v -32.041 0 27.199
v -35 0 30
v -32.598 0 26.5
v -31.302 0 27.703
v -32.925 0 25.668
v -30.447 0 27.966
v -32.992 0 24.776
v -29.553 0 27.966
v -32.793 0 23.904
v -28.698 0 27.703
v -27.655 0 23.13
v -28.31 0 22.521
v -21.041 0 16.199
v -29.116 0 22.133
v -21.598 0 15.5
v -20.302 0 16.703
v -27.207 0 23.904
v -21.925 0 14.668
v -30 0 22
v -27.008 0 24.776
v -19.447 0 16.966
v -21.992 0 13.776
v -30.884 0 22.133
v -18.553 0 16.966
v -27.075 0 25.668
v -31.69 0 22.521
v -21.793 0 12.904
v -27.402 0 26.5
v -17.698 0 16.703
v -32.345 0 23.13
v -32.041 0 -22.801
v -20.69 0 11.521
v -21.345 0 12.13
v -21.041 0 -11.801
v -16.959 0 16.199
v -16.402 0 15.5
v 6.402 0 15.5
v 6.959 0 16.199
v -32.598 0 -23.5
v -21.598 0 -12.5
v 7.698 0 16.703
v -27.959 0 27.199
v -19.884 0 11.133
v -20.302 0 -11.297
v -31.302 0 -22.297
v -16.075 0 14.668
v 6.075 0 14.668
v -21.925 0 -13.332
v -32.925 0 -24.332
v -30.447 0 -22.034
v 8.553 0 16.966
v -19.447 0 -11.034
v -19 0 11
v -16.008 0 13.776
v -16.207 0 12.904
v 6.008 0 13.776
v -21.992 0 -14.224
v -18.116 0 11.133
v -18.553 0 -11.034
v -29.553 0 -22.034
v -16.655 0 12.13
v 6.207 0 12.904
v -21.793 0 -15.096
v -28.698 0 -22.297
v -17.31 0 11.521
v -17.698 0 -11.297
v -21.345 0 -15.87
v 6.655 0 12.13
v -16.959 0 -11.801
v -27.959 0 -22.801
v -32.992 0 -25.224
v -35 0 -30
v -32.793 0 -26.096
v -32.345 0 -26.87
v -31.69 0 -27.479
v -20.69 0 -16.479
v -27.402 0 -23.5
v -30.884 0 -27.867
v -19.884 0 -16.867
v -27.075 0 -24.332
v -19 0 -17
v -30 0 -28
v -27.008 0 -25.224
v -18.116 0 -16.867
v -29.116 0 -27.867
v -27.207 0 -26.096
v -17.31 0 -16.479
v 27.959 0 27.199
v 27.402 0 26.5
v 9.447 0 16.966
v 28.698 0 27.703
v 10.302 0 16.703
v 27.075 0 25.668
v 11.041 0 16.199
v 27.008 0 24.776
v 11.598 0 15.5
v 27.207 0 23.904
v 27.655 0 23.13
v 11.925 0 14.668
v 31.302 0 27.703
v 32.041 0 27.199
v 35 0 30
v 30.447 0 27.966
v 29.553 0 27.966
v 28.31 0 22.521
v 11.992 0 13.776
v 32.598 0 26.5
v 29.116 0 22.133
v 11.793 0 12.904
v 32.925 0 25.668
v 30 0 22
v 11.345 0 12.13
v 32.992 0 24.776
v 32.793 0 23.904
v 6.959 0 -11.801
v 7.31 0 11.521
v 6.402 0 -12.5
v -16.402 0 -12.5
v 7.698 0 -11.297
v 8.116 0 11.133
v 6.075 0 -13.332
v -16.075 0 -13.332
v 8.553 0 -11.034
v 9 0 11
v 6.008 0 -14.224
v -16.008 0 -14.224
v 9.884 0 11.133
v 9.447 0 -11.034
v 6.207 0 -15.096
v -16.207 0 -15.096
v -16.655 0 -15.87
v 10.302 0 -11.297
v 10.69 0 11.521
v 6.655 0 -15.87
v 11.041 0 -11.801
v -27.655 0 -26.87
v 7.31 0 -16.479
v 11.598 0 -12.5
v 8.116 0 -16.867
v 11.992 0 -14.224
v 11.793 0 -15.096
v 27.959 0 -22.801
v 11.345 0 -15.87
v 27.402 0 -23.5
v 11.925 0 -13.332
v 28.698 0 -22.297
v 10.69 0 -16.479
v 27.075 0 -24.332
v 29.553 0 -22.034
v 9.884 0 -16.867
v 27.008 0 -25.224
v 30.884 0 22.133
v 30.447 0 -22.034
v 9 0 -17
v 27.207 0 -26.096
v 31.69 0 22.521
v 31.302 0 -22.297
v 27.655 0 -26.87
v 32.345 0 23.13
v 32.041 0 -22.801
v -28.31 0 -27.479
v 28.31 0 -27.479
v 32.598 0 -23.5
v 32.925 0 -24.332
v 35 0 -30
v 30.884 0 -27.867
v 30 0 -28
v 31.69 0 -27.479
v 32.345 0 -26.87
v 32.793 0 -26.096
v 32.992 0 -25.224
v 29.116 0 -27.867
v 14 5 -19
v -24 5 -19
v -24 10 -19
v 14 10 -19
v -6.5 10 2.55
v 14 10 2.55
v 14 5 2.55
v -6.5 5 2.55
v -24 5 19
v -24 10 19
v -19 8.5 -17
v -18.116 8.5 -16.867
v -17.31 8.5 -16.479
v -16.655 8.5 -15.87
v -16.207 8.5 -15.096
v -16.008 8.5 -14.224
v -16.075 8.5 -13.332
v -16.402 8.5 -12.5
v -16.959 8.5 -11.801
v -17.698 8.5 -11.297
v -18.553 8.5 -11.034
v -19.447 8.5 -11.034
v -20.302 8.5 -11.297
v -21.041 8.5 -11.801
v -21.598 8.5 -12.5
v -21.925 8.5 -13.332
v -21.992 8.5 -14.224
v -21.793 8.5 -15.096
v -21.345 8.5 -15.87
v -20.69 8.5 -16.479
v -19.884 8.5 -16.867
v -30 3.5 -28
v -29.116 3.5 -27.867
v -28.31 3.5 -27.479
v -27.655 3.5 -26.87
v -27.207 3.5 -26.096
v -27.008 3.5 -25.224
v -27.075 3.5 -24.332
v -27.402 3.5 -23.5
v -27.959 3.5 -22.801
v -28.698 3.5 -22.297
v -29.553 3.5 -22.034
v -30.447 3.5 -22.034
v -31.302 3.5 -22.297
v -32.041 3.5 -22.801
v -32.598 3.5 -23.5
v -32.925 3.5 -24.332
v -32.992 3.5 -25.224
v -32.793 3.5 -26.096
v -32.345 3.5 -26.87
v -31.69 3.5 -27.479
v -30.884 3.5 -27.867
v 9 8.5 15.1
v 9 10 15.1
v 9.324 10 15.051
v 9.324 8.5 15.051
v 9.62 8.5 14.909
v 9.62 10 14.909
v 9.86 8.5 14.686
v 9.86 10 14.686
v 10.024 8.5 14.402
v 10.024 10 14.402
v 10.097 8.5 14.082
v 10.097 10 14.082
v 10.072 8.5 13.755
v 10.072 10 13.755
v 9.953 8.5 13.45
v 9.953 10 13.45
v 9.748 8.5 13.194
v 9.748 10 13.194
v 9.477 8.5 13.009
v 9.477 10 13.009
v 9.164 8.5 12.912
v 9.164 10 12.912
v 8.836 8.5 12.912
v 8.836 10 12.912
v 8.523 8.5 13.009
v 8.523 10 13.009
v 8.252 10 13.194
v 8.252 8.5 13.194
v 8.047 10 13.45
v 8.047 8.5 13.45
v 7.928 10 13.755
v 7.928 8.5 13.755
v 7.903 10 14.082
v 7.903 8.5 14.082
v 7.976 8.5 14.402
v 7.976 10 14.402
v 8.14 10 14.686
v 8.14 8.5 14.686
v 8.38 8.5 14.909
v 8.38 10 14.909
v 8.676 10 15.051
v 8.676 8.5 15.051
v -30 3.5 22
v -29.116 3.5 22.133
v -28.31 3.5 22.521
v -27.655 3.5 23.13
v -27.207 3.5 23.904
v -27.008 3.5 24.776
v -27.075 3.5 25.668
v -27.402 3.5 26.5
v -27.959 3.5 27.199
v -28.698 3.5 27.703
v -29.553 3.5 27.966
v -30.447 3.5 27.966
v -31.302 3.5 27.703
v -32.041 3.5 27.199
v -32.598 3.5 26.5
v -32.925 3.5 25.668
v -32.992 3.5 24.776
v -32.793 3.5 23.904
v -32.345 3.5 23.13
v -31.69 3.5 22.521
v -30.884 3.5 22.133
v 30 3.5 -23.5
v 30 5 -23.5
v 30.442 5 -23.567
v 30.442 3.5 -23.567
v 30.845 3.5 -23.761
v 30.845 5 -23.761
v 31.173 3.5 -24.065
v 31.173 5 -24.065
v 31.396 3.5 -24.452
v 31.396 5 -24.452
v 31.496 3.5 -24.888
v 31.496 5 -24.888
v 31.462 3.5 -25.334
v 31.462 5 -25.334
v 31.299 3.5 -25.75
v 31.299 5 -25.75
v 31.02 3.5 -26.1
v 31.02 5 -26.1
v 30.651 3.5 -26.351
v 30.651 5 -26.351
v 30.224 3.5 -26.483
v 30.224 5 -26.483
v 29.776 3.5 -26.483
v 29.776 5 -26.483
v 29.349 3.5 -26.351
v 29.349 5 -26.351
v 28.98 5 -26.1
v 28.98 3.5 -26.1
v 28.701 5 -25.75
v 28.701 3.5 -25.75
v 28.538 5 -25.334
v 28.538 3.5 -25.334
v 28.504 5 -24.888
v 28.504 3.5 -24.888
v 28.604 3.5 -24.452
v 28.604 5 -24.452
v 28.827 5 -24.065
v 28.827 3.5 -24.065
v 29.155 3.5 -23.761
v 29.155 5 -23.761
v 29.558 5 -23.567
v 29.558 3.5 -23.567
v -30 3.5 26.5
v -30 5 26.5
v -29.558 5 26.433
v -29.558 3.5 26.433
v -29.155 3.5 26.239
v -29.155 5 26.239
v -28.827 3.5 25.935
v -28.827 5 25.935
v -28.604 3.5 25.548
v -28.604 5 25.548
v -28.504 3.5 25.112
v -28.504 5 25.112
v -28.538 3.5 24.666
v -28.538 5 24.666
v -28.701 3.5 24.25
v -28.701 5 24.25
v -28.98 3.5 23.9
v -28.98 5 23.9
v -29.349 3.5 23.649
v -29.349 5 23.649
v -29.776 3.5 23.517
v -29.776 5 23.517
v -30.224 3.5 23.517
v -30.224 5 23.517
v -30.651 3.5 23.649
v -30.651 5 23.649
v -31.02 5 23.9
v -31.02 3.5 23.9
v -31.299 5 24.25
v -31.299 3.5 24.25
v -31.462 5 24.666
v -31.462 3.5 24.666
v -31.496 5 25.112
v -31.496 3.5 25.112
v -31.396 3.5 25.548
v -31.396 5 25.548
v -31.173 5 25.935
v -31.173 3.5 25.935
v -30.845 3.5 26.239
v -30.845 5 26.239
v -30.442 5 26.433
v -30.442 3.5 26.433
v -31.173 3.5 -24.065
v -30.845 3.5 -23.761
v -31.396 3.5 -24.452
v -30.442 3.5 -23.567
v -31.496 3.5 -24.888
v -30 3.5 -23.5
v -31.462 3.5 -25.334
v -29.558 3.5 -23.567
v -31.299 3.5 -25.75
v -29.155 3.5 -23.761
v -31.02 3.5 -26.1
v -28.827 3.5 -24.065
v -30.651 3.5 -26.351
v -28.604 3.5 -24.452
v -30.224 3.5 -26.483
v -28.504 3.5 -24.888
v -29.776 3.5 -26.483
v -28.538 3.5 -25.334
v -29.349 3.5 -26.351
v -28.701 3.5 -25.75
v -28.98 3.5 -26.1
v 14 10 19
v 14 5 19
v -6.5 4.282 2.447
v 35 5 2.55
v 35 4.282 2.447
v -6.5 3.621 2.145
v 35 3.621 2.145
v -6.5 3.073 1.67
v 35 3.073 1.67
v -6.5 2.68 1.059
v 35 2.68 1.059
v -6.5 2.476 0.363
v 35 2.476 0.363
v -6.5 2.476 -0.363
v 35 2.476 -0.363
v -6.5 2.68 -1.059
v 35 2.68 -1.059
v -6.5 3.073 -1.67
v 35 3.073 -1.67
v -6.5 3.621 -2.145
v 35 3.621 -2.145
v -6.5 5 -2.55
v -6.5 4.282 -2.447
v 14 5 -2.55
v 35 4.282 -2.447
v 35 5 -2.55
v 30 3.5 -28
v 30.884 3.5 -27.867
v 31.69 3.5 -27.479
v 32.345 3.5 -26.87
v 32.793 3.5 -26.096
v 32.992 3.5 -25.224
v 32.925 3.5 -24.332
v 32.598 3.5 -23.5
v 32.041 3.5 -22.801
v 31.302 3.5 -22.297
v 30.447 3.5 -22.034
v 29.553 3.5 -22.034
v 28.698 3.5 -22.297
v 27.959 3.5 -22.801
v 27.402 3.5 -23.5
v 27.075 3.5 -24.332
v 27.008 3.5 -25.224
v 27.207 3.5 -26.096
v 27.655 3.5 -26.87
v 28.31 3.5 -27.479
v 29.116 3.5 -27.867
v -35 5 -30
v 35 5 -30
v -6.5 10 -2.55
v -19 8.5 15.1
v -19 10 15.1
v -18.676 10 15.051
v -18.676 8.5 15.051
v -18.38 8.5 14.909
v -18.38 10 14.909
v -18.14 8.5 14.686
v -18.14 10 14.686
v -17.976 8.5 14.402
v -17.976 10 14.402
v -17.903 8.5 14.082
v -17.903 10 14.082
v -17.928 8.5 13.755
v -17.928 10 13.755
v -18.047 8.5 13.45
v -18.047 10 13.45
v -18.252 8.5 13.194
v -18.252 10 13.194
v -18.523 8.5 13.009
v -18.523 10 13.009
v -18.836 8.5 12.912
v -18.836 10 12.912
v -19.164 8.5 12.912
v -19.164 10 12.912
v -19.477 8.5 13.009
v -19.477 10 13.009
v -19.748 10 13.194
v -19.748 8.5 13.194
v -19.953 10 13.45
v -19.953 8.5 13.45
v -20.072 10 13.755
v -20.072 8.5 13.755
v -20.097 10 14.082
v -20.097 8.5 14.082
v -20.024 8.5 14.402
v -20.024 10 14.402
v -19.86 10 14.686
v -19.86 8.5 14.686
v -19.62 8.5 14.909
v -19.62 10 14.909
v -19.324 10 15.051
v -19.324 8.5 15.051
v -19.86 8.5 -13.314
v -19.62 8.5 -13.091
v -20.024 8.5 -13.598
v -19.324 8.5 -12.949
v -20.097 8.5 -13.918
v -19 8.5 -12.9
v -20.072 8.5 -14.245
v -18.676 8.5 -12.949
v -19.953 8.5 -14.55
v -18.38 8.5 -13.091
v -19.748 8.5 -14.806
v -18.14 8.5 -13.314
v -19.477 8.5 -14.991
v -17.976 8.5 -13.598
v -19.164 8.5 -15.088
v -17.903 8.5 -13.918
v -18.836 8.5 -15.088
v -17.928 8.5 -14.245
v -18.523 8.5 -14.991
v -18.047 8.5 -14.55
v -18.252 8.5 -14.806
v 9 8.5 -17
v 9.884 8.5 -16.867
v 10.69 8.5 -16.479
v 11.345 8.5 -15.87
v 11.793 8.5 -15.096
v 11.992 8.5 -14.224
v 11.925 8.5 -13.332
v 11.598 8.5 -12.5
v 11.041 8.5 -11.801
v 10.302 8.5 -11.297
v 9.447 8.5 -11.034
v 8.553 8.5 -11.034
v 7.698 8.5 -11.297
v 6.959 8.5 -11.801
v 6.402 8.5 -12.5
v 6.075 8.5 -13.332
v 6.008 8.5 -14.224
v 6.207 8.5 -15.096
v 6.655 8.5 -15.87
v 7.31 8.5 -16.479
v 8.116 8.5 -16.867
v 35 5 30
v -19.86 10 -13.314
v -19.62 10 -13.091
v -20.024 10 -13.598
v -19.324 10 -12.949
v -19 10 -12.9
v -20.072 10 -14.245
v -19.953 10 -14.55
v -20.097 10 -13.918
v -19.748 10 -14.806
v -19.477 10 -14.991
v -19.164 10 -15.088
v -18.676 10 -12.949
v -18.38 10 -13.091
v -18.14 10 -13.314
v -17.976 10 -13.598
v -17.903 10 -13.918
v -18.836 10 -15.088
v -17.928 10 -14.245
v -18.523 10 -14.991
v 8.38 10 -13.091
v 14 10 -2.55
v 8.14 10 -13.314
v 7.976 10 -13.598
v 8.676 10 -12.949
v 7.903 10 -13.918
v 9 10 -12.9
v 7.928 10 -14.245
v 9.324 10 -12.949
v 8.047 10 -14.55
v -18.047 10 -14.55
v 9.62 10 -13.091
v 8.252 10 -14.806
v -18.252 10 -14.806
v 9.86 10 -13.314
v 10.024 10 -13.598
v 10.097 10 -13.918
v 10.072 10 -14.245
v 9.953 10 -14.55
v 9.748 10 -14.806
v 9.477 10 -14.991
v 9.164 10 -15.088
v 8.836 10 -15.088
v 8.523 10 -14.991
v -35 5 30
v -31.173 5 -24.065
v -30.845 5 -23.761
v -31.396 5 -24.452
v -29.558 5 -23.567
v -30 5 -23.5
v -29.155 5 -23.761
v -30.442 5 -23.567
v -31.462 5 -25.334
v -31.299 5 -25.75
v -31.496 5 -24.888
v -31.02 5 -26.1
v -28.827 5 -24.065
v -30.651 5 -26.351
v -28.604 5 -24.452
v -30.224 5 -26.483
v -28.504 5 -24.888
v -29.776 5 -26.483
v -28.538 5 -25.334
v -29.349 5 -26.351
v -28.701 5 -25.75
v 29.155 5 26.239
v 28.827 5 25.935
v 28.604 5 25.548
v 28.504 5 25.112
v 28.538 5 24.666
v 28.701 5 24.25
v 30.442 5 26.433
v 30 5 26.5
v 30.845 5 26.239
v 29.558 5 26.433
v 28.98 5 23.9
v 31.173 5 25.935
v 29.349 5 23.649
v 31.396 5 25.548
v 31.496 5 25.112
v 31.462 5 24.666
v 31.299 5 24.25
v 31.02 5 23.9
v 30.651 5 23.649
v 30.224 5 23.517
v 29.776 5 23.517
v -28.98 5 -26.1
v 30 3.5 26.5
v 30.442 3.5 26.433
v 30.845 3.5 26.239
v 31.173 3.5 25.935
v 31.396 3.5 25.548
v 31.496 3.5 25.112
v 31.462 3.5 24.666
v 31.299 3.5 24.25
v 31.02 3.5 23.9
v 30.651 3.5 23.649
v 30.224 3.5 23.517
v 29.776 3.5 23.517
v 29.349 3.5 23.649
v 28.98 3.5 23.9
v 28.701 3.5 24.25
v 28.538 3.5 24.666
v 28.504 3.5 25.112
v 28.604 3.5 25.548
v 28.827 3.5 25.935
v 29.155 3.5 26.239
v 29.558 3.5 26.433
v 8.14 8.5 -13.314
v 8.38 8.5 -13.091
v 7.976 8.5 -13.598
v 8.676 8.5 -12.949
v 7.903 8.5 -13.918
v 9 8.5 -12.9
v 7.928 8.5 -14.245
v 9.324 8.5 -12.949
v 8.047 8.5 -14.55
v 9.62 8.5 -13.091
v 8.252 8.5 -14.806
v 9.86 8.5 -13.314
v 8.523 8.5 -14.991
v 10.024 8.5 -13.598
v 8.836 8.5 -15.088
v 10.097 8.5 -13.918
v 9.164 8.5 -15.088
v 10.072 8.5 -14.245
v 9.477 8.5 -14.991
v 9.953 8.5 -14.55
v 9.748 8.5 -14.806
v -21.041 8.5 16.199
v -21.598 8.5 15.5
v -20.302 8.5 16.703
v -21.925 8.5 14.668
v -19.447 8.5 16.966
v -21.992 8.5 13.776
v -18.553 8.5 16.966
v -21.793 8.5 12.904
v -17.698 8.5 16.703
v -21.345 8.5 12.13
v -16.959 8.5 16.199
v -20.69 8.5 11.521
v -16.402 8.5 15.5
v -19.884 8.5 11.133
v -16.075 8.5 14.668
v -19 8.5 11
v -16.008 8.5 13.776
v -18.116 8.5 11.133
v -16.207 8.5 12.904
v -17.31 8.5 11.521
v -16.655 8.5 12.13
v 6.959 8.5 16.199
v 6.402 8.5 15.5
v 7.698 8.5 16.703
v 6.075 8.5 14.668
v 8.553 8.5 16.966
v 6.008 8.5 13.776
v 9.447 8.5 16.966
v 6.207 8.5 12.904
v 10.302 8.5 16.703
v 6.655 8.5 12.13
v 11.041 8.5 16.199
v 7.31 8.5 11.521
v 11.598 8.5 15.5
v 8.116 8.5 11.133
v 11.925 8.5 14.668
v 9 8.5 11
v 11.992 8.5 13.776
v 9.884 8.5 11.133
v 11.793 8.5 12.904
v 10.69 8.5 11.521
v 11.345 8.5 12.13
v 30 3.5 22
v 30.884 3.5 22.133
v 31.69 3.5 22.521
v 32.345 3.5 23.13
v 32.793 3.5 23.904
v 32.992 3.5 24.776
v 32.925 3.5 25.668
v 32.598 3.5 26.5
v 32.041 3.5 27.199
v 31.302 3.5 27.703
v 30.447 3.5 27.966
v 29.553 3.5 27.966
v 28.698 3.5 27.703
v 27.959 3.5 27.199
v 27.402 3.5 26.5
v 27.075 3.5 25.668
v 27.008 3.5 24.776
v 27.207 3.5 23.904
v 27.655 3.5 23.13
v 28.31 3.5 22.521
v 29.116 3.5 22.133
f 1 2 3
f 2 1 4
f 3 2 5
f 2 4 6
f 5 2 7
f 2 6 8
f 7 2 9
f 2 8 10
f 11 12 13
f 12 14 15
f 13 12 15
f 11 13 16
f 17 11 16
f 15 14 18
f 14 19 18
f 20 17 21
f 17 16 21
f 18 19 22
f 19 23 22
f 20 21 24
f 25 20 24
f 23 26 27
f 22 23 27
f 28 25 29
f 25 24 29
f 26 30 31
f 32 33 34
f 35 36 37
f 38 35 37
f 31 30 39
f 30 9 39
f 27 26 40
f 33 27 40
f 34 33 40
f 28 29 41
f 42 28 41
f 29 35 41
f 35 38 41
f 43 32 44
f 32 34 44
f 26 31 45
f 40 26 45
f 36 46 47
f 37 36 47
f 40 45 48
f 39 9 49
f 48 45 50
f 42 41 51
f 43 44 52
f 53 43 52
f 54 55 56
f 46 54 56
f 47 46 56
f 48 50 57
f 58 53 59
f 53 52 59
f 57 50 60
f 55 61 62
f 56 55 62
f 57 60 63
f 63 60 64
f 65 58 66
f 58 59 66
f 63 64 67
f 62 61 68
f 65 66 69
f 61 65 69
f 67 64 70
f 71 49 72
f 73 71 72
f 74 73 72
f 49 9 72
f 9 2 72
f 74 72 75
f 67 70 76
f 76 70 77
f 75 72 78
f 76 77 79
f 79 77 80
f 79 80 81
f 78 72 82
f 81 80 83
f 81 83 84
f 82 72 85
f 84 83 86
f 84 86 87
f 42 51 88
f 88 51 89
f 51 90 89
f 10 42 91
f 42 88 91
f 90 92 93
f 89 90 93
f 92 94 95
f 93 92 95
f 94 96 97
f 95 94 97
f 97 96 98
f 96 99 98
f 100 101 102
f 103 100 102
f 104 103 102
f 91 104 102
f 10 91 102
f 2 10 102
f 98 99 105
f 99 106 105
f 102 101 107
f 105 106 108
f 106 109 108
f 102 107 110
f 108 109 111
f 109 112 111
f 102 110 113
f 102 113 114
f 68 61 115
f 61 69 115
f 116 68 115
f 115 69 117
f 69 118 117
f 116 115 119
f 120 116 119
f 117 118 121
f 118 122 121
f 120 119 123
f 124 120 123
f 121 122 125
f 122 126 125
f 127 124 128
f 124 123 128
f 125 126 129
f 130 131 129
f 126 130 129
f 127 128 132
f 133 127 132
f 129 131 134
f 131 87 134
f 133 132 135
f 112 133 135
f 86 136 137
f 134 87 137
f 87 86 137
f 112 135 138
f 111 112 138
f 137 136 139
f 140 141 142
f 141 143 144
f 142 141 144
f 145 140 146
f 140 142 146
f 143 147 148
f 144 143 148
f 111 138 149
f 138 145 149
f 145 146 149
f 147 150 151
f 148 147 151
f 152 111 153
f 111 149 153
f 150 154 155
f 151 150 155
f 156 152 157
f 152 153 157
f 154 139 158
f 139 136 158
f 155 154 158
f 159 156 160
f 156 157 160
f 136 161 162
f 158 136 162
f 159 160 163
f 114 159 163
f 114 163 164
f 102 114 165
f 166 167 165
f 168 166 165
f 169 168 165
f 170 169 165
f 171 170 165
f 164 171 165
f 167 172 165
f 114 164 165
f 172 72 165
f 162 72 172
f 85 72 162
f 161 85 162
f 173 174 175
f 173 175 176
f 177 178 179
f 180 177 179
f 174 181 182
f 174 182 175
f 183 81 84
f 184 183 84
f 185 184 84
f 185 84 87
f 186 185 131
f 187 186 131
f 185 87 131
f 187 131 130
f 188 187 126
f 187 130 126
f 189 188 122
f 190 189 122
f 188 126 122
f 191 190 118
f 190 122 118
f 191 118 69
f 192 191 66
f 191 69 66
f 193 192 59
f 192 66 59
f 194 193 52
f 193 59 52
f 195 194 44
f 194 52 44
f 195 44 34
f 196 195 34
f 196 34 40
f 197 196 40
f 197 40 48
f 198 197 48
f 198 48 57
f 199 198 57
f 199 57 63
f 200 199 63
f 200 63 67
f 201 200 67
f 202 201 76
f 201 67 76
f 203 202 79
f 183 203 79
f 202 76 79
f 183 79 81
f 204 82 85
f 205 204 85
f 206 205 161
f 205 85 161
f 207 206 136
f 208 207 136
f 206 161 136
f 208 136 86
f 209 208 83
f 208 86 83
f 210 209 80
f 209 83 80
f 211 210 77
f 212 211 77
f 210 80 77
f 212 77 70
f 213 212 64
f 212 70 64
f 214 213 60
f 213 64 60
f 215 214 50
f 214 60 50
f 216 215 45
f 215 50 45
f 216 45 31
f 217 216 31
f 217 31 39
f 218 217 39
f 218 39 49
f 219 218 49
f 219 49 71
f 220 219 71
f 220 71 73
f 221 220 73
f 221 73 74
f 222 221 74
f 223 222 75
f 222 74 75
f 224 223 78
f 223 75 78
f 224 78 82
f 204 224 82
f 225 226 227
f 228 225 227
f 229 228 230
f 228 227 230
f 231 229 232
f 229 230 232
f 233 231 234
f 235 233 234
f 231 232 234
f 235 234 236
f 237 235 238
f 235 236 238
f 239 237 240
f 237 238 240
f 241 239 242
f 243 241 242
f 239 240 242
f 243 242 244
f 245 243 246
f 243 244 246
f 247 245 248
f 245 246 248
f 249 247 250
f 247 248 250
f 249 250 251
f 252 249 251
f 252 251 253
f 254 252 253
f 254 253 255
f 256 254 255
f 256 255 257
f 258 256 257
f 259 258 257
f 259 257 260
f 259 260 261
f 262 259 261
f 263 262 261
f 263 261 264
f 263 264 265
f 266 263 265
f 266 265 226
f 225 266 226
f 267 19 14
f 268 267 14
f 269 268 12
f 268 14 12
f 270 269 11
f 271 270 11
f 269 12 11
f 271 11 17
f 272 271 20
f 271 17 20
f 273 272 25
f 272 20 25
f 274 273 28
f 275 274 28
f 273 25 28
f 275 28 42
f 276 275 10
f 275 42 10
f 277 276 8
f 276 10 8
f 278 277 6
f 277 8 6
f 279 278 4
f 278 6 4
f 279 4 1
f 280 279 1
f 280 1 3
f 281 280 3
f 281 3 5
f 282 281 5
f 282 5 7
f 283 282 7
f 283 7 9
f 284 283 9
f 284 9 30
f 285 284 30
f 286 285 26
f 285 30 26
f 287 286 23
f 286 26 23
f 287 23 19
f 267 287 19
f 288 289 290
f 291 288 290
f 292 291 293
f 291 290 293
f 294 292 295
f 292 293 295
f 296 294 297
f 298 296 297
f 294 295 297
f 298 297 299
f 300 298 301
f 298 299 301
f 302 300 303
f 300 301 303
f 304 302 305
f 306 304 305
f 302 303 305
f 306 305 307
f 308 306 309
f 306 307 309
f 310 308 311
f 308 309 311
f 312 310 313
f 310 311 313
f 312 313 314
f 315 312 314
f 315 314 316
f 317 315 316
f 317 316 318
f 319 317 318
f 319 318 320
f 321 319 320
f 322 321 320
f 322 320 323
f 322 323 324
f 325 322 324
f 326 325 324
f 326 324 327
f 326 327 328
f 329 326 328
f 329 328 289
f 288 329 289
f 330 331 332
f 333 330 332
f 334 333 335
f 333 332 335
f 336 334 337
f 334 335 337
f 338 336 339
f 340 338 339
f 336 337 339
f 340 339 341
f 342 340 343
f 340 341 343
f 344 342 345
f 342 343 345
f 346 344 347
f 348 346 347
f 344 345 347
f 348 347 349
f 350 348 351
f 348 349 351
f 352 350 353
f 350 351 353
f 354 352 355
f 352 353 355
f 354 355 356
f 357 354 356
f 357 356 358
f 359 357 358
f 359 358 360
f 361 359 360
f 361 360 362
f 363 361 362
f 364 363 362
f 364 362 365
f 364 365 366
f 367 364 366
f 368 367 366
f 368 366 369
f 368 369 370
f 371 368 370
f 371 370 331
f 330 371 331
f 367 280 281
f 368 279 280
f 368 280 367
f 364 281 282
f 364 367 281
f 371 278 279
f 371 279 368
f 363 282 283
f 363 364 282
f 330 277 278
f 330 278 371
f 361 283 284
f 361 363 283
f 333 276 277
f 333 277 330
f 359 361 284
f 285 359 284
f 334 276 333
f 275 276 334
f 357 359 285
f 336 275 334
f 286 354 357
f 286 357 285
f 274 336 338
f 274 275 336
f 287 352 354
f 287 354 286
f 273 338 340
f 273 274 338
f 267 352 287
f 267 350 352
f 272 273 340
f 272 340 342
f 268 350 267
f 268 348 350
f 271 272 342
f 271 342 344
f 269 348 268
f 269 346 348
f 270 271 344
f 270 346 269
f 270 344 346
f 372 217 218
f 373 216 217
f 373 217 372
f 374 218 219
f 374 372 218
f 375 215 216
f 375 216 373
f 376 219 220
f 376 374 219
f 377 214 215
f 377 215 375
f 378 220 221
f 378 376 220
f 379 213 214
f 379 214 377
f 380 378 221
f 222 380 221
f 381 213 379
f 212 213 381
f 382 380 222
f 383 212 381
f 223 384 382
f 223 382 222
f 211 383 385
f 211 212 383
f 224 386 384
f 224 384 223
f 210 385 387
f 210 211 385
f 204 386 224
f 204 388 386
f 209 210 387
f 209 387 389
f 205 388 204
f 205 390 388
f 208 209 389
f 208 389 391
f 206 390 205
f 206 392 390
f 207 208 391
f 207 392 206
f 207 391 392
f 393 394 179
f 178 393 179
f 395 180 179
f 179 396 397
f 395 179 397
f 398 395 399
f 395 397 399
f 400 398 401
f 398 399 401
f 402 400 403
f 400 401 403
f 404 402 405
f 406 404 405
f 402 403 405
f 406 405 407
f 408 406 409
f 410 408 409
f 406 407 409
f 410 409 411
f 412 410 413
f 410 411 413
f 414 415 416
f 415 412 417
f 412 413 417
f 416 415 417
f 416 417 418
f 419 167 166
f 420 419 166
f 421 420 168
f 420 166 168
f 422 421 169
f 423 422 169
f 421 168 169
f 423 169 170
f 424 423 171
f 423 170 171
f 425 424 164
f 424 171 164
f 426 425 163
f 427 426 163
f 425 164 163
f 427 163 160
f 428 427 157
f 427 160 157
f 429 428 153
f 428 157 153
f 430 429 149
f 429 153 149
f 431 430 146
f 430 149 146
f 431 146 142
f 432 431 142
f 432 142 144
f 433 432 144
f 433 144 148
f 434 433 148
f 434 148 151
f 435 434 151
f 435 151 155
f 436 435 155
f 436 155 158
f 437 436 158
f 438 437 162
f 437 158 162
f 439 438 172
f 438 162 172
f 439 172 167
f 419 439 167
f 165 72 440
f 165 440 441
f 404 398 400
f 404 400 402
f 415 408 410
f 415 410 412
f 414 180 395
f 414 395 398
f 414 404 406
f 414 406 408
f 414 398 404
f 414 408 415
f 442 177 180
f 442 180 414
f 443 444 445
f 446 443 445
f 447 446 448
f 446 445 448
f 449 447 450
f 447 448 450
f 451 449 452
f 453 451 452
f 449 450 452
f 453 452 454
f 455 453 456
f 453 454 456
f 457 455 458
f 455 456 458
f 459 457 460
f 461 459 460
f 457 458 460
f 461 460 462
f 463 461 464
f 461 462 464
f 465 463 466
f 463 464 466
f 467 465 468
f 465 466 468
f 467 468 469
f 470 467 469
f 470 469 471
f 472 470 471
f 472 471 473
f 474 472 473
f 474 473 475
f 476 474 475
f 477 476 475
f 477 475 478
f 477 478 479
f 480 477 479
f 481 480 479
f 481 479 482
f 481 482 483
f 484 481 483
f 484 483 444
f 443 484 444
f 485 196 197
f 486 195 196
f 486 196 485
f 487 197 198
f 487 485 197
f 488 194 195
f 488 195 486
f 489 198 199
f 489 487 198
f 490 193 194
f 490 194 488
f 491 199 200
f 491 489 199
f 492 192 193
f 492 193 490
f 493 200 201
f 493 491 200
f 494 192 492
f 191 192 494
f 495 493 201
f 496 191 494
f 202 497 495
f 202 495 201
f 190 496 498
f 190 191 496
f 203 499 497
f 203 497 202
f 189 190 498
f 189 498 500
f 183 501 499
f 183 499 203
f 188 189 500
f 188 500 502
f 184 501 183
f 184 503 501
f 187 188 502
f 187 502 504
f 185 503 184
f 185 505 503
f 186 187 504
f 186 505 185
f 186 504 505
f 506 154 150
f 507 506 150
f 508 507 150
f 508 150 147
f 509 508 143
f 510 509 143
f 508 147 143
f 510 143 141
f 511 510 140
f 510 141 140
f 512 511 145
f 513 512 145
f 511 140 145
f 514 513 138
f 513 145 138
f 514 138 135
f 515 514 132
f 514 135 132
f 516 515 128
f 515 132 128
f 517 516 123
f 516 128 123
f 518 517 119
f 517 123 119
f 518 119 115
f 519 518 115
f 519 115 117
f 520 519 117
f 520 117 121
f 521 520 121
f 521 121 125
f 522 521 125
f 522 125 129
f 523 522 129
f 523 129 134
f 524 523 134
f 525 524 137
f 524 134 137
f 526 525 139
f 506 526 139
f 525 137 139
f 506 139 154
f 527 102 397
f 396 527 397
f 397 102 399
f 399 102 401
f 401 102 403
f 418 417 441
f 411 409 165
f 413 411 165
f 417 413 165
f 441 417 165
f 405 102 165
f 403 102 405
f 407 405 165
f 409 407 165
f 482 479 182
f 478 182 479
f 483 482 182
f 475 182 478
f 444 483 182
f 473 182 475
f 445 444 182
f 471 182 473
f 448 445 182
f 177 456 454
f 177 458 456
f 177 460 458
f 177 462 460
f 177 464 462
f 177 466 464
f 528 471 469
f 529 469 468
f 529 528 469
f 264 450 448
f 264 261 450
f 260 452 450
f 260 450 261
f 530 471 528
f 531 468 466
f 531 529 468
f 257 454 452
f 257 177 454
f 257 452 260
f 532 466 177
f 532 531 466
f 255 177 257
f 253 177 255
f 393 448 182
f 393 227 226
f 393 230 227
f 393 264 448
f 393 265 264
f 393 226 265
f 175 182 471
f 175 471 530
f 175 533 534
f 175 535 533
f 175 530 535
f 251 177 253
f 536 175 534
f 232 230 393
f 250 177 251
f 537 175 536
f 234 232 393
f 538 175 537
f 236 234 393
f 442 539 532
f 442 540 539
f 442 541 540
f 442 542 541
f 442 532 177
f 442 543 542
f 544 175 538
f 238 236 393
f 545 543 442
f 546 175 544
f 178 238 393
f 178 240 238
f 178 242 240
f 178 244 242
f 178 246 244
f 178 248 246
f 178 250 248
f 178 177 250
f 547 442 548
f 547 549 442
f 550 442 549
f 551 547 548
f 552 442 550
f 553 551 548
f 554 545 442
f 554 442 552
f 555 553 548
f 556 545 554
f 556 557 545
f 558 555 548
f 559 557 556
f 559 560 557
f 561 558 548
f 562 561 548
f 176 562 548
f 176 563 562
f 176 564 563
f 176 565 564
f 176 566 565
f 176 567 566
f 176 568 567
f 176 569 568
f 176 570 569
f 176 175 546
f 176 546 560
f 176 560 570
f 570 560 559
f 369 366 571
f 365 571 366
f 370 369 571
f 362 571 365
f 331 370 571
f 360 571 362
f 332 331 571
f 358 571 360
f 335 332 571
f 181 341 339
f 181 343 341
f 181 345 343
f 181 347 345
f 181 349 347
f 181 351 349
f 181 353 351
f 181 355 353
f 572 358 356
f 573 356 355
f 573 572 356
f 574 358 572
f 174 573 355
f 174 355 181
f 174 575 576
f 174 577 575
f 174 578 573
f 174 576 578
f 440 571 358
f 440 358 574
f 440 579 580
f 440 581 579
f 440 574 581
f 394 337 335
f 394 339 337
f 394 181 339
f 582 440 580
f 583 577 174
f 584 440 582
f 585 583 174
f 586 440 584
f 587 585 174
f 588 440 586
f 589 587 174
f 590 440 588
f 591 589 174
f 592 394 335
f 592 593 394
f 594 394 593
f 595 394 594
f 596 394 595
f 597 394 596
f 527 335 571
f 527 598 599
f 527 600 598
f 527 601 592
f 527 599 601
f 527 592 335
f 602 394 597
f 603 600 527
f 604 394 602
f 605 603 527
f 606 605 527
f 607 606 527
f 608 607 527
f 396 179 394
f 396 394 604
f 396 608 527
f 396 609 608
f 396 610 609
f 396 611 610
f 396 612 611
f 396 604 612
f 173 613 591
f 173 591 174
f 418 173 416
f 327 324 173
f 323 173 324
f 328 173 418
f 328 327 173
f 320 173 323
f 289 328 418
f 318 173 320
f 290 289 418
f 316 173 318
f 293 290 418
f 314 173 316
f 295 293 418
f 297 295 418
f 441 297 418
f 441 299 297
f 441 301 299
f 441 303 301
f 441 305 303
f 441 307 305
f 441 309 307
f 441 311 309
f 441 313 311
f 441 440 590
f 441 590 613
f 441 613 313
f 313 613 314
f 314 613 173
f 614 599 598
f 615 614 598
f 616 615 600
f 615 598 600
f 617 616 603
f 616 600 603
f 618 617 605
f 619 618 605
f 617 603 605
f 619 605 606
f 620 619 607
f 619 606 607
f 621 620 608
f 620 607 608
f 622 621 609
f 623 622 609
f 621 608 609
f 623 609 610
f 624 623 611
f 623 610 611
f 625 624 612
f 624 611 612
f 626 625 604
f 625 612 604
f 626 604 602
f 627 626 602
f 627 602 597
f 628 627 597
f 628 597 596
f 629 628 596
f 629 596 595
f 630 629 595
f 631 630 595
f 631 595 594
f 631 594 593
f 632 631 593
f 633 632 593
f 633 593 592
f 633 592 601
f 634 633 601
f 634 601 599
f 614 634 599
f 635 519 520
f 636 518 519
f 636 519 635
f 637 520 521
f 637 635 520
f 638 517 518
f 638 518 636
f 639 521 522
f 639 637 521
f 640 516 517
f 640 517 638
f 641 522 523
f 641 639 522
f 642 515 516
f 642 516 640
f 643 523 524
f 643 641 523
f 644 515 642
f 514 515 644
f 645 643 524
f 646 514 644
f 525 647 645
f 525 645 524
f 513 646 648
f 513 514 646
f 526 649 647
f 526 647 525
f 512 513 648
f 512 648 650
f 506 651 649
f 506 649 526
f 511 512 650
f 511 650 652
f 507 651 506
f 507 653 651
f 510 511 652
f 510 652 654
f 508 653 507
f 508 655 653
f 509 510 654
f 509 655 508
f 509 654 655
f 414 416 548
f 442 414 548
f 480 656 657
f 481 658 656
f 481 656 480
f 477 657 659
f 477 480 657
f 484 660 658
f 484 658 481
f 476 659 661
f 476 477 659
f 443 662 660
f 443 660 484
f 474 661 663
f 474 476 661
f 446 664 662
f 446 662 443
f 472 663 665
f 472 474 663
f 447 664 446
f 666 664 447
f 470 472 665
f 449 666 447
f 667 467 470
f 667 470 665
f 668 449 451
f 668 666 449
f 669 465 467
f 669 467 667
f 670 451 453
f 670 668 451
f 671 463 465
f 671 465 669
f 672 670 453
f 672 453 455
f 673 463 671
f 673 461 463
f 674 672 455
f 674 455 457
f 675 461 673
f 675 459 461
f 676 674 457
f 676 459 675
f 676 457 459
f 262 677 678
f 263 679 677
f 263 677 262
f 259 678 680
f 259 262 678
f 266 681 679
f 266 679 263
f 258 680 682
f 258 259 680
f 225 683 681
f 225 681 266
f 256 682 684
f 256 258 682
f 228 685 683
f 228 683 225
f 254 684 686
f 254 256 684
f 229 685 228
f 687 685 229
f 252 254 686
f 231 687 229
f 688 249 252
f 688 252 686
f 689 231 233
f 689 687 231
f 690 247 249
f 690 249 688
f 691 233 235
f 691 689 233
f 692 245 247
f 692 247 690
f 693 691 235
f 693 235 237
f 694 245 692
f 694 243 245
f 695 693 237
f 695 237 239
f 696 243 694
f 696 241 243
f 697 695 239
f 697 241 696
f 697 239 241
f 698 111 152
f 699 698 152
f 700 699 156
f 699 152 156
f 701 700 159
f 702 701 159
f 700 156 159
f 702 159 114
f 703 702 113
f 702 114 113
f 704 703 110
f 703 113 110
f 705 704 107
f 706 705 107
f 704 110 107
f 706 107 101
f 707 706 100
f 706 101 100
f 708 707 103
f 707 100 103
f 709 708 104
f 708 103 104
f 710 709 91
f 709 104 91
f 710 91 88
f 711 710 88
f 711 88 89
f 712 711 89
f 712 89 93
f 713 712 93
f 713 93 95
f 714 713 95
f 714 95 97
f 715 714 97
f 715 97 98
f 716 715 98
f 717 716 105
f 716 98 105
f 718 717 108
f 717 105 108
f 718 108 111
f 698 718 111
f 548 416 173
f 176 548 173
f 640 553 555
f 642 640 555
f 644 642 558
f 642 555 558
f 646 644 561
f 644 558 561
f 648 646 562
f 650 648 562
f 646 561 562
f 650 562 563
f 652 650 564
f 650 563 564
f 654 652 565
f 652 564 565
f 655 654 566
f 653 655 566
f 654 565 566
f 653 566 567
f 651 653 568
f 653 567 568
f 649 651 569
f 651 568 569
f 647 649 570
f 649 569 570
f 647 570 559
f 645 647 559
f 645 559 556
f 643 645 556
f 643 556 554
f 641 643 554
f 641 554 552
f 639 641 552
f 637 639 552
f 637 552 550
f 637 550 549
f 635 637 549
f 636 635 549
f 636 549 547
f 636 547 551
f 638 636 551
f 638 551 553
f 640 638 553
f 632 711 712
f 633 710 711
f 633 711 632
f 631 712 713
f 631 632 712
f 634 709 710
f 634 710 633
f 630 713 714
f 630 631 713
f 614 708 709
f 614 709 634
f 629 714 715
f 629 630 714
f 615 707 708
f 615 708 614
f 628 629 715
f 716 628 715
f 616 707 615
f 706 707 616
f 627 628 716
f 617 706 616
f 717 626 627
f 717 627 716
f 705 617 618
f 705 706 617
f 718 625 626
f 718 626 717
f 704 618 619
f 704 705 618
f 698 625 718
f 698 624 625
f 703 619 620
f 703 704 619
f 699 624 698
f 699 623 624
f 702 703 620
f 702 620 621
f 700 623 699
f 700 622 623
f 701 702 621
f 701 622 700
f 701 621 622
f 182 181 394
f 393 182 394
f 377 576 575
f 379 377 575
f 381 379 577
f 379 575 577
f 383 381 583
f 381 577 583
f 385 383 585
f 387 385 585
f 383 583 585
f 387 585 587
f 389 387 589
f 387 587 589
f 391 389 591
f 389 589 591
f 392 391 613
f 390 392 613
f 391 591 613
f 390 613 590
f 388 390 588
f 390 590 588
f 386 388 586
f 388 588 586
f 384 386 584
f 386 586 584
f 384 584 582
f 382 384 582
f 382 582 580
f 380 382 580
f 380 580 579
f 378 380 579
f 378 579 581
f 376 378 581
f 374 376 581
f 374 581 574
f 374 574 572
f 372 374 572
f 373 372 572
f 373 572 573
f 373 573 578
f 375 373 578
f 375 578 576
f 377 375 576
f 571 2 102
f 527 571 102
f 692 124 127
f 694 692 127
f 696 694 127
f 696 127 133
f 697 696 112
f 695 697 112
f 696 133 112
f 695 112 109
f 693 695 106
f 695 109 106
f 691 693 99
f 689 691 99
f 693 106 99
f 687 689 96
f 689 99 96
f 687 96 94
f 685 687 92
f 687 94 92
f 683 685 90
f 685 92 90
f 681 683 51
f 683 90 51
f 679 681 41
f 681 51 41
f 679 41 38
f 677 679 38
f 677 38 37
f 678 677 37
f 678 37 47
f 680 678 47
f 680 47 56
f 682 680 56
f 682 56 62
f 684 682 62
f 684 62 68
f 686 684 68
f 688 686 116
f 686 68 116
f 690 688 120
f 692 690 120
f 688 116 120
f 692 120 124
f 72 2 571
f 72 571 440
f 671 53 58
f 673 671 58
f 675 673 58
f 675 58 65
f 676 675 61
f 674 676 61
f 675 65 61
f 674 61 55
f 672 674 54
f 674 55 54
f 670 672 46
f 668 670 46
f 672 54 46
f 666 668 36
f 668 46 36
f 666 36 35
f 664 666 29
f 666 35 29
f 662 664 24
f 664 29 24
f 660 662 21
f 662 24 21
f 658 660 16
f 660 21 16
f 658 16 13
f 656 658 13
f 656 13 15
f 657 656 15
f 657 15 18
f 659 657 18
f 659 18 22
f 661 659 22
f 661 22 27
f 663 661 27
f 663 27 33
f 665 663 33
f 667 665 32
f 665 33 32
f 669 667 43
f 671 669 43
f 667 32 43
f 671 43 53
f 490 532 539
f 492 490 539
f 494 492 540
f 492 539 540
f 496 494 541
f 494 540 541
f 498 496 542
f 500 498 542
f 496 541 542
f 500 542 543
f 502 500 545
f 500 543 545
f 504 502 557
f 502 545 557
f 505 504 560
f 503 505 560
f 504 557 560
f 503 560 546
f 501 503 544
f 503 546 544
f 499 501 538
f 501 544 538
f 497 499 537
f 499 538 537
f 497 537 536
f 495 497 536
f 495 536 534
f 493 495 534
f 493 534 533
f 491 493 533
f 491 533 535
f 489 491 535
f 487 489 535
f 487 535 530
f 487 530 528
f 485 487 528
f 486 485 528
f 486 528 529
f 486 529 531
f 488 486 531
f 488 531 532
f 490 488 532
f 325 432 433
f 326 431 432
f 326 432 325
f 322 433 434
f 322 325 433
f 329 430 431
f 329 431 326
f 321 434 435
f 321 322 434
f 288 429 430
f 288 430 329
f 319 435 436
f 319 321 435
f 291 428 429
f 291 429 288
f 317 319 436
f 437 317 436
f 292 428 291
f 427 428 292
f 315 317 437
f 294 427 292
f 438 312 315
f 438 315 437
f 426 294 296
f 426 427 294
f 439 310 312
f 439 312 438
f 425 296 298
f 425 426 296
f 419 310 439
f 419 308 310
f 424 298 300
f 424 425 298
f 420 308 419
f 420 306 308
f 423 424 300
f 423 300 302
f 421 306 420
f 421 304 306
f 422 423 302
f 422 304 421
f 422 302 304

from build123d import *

# Parameters (mm, degrees)
SKETCH_1_W          = 70
SKETCH_1_H          = 60
EXTRUDE_1_DEPTH     = 5
SKETCH_2_W          = 38
SKETCH_2_H          = 38
EXTRUDE_2_DEPTH     = 5
CUT_EXTRUDE_1_REACH = 49.17
SKETCH_3_R          = 1.1
SKETCH_4_R          = 3
CUT_EXTRUDE_2_DEPTH = 8.5
CUT_EXTRUDE_3_REACH = 48.368
SKETCH_5_R          = 1.5
SKETCH_6_R          = 3
CUT_EXTRUDE_4_DEPTH = 3.5
CUT_EXTRUDE_5_DEPTH = 41.5


with BuildPart() as part:
    # 草图1 → 凸台-拉伸1 (new body)
    with BuildSketch(Plane(origin=(0, 0, 0), x_dir=(1, 0, 0), z_dir=(0, 1, 0))):
        Rectangle(SKETCH_1_W, SKETCH_1_H)
    extrude(amount=EXTRUDE_1_DEPTH)

    # 草图2 → 凸台-拉伸2 (add)
    with BuildSketch(Plane(origin=(0, 5, 0), x_dir=(1, 0, 0), z_dir=(0, 1, 0))):
        with Locations((-5, 0)):
            Rectangle(SKETCH_2_W, SKETCH_2_H)
    extrude(amount=EXTRUDE_2_DEPTH)

    # 草图3 → 切除-拉伸1 (cut, up to next)
    with BuildSketch(Plane(origin=(0, 10, 0), x_dir=(1, 0, 0), z_dir=(0, 1, 0)), mode=Mode.PRIVATE) as cut_extrude_1_sk1:
        with Locations(Location((-19, 14, 0), (0, 0, 270))):
            Circle(SKETCH_3_R)
    cut_extrude_1_tool1 = extrude(cut_extrude_1_sk1.sketch, amount=-CUT_EXTRUDE_1_REACH, mode=Mode.PRIVATE) & part.part
    # 草图3 → 切除-拉伸1 (cut, up to next)
    with BuildSketch(Plane(origin=(0, 10, 0), x_dir=(1, 0, 0), z_dir=(0, 1, 0)), mode=Mode.PRIVATE) as cut_extrude_1_sk2:
        with Locations(Location((9, 14, 0), (0, 0, 270))):
            Circle(SKETCH_3_R)
    cut_extrude_1_tool2 = extrude(cut_extrude_1_sk2.sketch, amount=-CUT_EXTRUDE_1_REACH, mode=Mode.PRIVATE) & part.part
    # 草图3 → 切除-拉伸1 (cut, up to next)
    with BuildSketch(Plane(origin=(0, 10, 0), x_dir=(1, 0, 0), z_dir=(0, 1, 0)), mode=Mode.PRIVATE) as cut_extrude_1_sk3:
        with Locations(Location((-19, -14, 0), (0, 0, 270))):
            Circle(SKETCH_3_R)
    cut_extrude_1_tool3 = extrude(cut_extrude_1_sk3.sketch, amount=-CUT_EXTRUDE_1_REACH, mode=Mode.PRIVATE) & part.part
    # 草图3 → 切除-拉伸1 (cut, up to next)
    with BuildSketch(Plane(origin=(0, 10, 0), x_dir=(1, 0, 0), z_dir=(0, 1, 0)), mode=Mode.PRIVATE) as cut_extrude_1_sk4:
        with Locations(Location((9, -14, 0), (0, 0, 270))):
            Circle(SKETCH_3_R)
    cut_extrude_1_tool4 = extrude(cut_extrude_1_sk4.sketch, amount=-CUT_EXTRUDE_1_REACH, mode=Mode.PRIVATE) & part.part
    add(cut_extrude_1_tool1.solids().sort_by_distance((-19, 10, -14))[0], mode=Mode.SUBTRACT)
    add(cut_extrude_1_tool2.solids().sort_by_distance((9, 10, -14))[0], mode=Mode.SUBTRACT)
    add(cut_extrude_1_tool3.solids().sort_by_distance((-19, 10, 14))[0], mode=Mode.SUBTRACT)
    add(cut_extrude_1_tool4.solids().sort_by_distance((9, 10, 14))[0], mode=Mode.SUBTRACT)

    # 草图4 → 切除-拉伸2 (cut)
    with BuildSketch(Plane.XZ):
        with Locations(Location((-19, -14, 0), (0, 0, 270))):
            Circle(SKETCH_4_R)
        with Locations(Location((-19, 14, 0), (0, 0, 270))):
            Circle(SKETCH_4_R)
        with Locations(Location((9, 14, 0), (0, 0, 270))):
            Circle(SKETCH_4_R)
        with Locations(Location((9, -14, 0), (0, 0, 270))):
            Circle(SKETCH_4_R)
    extrude(amount=-CUT_EXTRUDE_2_DEPTH, mode=Mode.SUBTRACT)

    # 草图5 → 切除-拉伸3 (cut, up to next)
    with BuildSketch(Plane(origin=(0, 5, 0), x_dir=(1, 0, 0), z_dir=(0, 1, 0)), mode=Mode.PRIVATE) as cut_extrude_3_sk1:
        with Locations(Location((-30, 25, 0), (0, 0, 270))):
            Circle(SKETCH_5_R)
    cut_extrude_3_tool1 = extrude(cut_extrude_3_sk1.sketch, amount=-CUT_EXTRUDE_3_REACH, mode=Mode.PRIVATE) & part.part
    # 草图5 → 切除-拉伸3 (cut, up to next)
    with BuildSketch(Plane(origin=(0, 5, 0), x_dir=(1, 0, 0), z_dir=(0, 1, 0)), mode=Mode.PRIVATE) as cut_extrude_3_sk2:
        with Locations(Location((30, 25, 0), (0, 0, 270))):
            Circle(SKETCH_5_R)
    cut_extrude_3_tool2 = extrude(cut_extrude_3_sk2.sketch, amount=-CUT_EXTRUDE_3_REACH, mode=Mode.PRIVATE) & part.part
    # 草图5 → 切除-拉伸3 (cut, up to next)
    with BuildSketch(Plane(origin=(0, 5, 0), x_dir=(1, 0, 0), z_dir=(0, 1, 0)), mode=Mode.PRIVATE) as cut_extrude_3_sk3:
        with Locations(Location((30, -25, 0), (0, 0, 270))):
            Circle(SKETCH_5_R)
    cut_extrude_3_tool3 = extrude(cut_extrude_3_sk3.sketch, amount=-CUT_EXTRUDE_3_REACH, mode=Mode.PRIVATE) & part.part
    # 草图5 → 切除-拉伸3 (cut, up to next)
    with BuildSketch(Plane(origin=(0, 5, 0), x_dir=(1, 0, 0), z_dir=(0, 1, 0)), mode=Mode.PRIVATE) as cut_extrude_3_sk4:
        with Locations(Location((-30, -25, 0), (0, 0, 270))):
            Circle(SKETCH_5_R)
    cut_extrude_3_tool4 = extrude(cut_extrude_3_sk4.sketch, amount=-CUT_EXTRUDE_3_REACH, mode=Mode.PRIVATE) & part.part
    add(cut_extrude_3_tool1.solids().sort_by_distance((-30, 5, -25))[0], mode=Mode.SUBTRACT)
    add(cut_extrude_3_tool2.solids().sort_by_distance((30, 5, -25))[0], mode=Mode.SUBTRACT)
    add(cut_extrude_3_tool3.solids().sort_by_distance((30, 5, 25))[0], mode=Mode.SUBTRACT)
    add(cut_extrude_3_tool4.solids().sort_by_distance((-30, 5, 25))[0], mode=Mode.SUBTRACT)

    # 草图6 → 切除-拉伸4 (cut)
    with BuildSketch(Plane.XZ):
        with Locations(Location((-30, -25, 0), (0, 0, 270))):
            Circle(SKETCH_6_R)
        with Locations(Location((30, -25, 0), (0, 0, 270))):
            Circle(SKETCH_6_R)
        with Locations(Location((30, 25, 0), (0, 0, 270))):
            Circle(SKETCH_6_R)
        with Locations(Location((-30, 25, 0), (0, 0, 270))):
            Circle(SKETCH_6_R)
    extrude(amount=-CUT_EXTRUDE_4_DEPTH, mode=Mode.SUBTRACT)

    # 草图7 → 切除-拉伸5 (cut)
    with BuildSketch(Plane(origin=(35, 0, 0), x_dir=(0, 0, -1), z_dir=(1, 0, 0))):
        with BuildLine():
            Line((2.55, 5), (2.55, 10))
            Line((2.55, 10), (-2.55, 10))
            Line((-2.55, 10), (-2.55, 5))
            ThreePointArc((-2.55, 5), (0, 2.45), (2.55, 5))
        make_face()
    extrude(amount=-CUT_EXTRUDE_5_DEPTH, mode=Mode.SUBTRACT)


solid = part.part
